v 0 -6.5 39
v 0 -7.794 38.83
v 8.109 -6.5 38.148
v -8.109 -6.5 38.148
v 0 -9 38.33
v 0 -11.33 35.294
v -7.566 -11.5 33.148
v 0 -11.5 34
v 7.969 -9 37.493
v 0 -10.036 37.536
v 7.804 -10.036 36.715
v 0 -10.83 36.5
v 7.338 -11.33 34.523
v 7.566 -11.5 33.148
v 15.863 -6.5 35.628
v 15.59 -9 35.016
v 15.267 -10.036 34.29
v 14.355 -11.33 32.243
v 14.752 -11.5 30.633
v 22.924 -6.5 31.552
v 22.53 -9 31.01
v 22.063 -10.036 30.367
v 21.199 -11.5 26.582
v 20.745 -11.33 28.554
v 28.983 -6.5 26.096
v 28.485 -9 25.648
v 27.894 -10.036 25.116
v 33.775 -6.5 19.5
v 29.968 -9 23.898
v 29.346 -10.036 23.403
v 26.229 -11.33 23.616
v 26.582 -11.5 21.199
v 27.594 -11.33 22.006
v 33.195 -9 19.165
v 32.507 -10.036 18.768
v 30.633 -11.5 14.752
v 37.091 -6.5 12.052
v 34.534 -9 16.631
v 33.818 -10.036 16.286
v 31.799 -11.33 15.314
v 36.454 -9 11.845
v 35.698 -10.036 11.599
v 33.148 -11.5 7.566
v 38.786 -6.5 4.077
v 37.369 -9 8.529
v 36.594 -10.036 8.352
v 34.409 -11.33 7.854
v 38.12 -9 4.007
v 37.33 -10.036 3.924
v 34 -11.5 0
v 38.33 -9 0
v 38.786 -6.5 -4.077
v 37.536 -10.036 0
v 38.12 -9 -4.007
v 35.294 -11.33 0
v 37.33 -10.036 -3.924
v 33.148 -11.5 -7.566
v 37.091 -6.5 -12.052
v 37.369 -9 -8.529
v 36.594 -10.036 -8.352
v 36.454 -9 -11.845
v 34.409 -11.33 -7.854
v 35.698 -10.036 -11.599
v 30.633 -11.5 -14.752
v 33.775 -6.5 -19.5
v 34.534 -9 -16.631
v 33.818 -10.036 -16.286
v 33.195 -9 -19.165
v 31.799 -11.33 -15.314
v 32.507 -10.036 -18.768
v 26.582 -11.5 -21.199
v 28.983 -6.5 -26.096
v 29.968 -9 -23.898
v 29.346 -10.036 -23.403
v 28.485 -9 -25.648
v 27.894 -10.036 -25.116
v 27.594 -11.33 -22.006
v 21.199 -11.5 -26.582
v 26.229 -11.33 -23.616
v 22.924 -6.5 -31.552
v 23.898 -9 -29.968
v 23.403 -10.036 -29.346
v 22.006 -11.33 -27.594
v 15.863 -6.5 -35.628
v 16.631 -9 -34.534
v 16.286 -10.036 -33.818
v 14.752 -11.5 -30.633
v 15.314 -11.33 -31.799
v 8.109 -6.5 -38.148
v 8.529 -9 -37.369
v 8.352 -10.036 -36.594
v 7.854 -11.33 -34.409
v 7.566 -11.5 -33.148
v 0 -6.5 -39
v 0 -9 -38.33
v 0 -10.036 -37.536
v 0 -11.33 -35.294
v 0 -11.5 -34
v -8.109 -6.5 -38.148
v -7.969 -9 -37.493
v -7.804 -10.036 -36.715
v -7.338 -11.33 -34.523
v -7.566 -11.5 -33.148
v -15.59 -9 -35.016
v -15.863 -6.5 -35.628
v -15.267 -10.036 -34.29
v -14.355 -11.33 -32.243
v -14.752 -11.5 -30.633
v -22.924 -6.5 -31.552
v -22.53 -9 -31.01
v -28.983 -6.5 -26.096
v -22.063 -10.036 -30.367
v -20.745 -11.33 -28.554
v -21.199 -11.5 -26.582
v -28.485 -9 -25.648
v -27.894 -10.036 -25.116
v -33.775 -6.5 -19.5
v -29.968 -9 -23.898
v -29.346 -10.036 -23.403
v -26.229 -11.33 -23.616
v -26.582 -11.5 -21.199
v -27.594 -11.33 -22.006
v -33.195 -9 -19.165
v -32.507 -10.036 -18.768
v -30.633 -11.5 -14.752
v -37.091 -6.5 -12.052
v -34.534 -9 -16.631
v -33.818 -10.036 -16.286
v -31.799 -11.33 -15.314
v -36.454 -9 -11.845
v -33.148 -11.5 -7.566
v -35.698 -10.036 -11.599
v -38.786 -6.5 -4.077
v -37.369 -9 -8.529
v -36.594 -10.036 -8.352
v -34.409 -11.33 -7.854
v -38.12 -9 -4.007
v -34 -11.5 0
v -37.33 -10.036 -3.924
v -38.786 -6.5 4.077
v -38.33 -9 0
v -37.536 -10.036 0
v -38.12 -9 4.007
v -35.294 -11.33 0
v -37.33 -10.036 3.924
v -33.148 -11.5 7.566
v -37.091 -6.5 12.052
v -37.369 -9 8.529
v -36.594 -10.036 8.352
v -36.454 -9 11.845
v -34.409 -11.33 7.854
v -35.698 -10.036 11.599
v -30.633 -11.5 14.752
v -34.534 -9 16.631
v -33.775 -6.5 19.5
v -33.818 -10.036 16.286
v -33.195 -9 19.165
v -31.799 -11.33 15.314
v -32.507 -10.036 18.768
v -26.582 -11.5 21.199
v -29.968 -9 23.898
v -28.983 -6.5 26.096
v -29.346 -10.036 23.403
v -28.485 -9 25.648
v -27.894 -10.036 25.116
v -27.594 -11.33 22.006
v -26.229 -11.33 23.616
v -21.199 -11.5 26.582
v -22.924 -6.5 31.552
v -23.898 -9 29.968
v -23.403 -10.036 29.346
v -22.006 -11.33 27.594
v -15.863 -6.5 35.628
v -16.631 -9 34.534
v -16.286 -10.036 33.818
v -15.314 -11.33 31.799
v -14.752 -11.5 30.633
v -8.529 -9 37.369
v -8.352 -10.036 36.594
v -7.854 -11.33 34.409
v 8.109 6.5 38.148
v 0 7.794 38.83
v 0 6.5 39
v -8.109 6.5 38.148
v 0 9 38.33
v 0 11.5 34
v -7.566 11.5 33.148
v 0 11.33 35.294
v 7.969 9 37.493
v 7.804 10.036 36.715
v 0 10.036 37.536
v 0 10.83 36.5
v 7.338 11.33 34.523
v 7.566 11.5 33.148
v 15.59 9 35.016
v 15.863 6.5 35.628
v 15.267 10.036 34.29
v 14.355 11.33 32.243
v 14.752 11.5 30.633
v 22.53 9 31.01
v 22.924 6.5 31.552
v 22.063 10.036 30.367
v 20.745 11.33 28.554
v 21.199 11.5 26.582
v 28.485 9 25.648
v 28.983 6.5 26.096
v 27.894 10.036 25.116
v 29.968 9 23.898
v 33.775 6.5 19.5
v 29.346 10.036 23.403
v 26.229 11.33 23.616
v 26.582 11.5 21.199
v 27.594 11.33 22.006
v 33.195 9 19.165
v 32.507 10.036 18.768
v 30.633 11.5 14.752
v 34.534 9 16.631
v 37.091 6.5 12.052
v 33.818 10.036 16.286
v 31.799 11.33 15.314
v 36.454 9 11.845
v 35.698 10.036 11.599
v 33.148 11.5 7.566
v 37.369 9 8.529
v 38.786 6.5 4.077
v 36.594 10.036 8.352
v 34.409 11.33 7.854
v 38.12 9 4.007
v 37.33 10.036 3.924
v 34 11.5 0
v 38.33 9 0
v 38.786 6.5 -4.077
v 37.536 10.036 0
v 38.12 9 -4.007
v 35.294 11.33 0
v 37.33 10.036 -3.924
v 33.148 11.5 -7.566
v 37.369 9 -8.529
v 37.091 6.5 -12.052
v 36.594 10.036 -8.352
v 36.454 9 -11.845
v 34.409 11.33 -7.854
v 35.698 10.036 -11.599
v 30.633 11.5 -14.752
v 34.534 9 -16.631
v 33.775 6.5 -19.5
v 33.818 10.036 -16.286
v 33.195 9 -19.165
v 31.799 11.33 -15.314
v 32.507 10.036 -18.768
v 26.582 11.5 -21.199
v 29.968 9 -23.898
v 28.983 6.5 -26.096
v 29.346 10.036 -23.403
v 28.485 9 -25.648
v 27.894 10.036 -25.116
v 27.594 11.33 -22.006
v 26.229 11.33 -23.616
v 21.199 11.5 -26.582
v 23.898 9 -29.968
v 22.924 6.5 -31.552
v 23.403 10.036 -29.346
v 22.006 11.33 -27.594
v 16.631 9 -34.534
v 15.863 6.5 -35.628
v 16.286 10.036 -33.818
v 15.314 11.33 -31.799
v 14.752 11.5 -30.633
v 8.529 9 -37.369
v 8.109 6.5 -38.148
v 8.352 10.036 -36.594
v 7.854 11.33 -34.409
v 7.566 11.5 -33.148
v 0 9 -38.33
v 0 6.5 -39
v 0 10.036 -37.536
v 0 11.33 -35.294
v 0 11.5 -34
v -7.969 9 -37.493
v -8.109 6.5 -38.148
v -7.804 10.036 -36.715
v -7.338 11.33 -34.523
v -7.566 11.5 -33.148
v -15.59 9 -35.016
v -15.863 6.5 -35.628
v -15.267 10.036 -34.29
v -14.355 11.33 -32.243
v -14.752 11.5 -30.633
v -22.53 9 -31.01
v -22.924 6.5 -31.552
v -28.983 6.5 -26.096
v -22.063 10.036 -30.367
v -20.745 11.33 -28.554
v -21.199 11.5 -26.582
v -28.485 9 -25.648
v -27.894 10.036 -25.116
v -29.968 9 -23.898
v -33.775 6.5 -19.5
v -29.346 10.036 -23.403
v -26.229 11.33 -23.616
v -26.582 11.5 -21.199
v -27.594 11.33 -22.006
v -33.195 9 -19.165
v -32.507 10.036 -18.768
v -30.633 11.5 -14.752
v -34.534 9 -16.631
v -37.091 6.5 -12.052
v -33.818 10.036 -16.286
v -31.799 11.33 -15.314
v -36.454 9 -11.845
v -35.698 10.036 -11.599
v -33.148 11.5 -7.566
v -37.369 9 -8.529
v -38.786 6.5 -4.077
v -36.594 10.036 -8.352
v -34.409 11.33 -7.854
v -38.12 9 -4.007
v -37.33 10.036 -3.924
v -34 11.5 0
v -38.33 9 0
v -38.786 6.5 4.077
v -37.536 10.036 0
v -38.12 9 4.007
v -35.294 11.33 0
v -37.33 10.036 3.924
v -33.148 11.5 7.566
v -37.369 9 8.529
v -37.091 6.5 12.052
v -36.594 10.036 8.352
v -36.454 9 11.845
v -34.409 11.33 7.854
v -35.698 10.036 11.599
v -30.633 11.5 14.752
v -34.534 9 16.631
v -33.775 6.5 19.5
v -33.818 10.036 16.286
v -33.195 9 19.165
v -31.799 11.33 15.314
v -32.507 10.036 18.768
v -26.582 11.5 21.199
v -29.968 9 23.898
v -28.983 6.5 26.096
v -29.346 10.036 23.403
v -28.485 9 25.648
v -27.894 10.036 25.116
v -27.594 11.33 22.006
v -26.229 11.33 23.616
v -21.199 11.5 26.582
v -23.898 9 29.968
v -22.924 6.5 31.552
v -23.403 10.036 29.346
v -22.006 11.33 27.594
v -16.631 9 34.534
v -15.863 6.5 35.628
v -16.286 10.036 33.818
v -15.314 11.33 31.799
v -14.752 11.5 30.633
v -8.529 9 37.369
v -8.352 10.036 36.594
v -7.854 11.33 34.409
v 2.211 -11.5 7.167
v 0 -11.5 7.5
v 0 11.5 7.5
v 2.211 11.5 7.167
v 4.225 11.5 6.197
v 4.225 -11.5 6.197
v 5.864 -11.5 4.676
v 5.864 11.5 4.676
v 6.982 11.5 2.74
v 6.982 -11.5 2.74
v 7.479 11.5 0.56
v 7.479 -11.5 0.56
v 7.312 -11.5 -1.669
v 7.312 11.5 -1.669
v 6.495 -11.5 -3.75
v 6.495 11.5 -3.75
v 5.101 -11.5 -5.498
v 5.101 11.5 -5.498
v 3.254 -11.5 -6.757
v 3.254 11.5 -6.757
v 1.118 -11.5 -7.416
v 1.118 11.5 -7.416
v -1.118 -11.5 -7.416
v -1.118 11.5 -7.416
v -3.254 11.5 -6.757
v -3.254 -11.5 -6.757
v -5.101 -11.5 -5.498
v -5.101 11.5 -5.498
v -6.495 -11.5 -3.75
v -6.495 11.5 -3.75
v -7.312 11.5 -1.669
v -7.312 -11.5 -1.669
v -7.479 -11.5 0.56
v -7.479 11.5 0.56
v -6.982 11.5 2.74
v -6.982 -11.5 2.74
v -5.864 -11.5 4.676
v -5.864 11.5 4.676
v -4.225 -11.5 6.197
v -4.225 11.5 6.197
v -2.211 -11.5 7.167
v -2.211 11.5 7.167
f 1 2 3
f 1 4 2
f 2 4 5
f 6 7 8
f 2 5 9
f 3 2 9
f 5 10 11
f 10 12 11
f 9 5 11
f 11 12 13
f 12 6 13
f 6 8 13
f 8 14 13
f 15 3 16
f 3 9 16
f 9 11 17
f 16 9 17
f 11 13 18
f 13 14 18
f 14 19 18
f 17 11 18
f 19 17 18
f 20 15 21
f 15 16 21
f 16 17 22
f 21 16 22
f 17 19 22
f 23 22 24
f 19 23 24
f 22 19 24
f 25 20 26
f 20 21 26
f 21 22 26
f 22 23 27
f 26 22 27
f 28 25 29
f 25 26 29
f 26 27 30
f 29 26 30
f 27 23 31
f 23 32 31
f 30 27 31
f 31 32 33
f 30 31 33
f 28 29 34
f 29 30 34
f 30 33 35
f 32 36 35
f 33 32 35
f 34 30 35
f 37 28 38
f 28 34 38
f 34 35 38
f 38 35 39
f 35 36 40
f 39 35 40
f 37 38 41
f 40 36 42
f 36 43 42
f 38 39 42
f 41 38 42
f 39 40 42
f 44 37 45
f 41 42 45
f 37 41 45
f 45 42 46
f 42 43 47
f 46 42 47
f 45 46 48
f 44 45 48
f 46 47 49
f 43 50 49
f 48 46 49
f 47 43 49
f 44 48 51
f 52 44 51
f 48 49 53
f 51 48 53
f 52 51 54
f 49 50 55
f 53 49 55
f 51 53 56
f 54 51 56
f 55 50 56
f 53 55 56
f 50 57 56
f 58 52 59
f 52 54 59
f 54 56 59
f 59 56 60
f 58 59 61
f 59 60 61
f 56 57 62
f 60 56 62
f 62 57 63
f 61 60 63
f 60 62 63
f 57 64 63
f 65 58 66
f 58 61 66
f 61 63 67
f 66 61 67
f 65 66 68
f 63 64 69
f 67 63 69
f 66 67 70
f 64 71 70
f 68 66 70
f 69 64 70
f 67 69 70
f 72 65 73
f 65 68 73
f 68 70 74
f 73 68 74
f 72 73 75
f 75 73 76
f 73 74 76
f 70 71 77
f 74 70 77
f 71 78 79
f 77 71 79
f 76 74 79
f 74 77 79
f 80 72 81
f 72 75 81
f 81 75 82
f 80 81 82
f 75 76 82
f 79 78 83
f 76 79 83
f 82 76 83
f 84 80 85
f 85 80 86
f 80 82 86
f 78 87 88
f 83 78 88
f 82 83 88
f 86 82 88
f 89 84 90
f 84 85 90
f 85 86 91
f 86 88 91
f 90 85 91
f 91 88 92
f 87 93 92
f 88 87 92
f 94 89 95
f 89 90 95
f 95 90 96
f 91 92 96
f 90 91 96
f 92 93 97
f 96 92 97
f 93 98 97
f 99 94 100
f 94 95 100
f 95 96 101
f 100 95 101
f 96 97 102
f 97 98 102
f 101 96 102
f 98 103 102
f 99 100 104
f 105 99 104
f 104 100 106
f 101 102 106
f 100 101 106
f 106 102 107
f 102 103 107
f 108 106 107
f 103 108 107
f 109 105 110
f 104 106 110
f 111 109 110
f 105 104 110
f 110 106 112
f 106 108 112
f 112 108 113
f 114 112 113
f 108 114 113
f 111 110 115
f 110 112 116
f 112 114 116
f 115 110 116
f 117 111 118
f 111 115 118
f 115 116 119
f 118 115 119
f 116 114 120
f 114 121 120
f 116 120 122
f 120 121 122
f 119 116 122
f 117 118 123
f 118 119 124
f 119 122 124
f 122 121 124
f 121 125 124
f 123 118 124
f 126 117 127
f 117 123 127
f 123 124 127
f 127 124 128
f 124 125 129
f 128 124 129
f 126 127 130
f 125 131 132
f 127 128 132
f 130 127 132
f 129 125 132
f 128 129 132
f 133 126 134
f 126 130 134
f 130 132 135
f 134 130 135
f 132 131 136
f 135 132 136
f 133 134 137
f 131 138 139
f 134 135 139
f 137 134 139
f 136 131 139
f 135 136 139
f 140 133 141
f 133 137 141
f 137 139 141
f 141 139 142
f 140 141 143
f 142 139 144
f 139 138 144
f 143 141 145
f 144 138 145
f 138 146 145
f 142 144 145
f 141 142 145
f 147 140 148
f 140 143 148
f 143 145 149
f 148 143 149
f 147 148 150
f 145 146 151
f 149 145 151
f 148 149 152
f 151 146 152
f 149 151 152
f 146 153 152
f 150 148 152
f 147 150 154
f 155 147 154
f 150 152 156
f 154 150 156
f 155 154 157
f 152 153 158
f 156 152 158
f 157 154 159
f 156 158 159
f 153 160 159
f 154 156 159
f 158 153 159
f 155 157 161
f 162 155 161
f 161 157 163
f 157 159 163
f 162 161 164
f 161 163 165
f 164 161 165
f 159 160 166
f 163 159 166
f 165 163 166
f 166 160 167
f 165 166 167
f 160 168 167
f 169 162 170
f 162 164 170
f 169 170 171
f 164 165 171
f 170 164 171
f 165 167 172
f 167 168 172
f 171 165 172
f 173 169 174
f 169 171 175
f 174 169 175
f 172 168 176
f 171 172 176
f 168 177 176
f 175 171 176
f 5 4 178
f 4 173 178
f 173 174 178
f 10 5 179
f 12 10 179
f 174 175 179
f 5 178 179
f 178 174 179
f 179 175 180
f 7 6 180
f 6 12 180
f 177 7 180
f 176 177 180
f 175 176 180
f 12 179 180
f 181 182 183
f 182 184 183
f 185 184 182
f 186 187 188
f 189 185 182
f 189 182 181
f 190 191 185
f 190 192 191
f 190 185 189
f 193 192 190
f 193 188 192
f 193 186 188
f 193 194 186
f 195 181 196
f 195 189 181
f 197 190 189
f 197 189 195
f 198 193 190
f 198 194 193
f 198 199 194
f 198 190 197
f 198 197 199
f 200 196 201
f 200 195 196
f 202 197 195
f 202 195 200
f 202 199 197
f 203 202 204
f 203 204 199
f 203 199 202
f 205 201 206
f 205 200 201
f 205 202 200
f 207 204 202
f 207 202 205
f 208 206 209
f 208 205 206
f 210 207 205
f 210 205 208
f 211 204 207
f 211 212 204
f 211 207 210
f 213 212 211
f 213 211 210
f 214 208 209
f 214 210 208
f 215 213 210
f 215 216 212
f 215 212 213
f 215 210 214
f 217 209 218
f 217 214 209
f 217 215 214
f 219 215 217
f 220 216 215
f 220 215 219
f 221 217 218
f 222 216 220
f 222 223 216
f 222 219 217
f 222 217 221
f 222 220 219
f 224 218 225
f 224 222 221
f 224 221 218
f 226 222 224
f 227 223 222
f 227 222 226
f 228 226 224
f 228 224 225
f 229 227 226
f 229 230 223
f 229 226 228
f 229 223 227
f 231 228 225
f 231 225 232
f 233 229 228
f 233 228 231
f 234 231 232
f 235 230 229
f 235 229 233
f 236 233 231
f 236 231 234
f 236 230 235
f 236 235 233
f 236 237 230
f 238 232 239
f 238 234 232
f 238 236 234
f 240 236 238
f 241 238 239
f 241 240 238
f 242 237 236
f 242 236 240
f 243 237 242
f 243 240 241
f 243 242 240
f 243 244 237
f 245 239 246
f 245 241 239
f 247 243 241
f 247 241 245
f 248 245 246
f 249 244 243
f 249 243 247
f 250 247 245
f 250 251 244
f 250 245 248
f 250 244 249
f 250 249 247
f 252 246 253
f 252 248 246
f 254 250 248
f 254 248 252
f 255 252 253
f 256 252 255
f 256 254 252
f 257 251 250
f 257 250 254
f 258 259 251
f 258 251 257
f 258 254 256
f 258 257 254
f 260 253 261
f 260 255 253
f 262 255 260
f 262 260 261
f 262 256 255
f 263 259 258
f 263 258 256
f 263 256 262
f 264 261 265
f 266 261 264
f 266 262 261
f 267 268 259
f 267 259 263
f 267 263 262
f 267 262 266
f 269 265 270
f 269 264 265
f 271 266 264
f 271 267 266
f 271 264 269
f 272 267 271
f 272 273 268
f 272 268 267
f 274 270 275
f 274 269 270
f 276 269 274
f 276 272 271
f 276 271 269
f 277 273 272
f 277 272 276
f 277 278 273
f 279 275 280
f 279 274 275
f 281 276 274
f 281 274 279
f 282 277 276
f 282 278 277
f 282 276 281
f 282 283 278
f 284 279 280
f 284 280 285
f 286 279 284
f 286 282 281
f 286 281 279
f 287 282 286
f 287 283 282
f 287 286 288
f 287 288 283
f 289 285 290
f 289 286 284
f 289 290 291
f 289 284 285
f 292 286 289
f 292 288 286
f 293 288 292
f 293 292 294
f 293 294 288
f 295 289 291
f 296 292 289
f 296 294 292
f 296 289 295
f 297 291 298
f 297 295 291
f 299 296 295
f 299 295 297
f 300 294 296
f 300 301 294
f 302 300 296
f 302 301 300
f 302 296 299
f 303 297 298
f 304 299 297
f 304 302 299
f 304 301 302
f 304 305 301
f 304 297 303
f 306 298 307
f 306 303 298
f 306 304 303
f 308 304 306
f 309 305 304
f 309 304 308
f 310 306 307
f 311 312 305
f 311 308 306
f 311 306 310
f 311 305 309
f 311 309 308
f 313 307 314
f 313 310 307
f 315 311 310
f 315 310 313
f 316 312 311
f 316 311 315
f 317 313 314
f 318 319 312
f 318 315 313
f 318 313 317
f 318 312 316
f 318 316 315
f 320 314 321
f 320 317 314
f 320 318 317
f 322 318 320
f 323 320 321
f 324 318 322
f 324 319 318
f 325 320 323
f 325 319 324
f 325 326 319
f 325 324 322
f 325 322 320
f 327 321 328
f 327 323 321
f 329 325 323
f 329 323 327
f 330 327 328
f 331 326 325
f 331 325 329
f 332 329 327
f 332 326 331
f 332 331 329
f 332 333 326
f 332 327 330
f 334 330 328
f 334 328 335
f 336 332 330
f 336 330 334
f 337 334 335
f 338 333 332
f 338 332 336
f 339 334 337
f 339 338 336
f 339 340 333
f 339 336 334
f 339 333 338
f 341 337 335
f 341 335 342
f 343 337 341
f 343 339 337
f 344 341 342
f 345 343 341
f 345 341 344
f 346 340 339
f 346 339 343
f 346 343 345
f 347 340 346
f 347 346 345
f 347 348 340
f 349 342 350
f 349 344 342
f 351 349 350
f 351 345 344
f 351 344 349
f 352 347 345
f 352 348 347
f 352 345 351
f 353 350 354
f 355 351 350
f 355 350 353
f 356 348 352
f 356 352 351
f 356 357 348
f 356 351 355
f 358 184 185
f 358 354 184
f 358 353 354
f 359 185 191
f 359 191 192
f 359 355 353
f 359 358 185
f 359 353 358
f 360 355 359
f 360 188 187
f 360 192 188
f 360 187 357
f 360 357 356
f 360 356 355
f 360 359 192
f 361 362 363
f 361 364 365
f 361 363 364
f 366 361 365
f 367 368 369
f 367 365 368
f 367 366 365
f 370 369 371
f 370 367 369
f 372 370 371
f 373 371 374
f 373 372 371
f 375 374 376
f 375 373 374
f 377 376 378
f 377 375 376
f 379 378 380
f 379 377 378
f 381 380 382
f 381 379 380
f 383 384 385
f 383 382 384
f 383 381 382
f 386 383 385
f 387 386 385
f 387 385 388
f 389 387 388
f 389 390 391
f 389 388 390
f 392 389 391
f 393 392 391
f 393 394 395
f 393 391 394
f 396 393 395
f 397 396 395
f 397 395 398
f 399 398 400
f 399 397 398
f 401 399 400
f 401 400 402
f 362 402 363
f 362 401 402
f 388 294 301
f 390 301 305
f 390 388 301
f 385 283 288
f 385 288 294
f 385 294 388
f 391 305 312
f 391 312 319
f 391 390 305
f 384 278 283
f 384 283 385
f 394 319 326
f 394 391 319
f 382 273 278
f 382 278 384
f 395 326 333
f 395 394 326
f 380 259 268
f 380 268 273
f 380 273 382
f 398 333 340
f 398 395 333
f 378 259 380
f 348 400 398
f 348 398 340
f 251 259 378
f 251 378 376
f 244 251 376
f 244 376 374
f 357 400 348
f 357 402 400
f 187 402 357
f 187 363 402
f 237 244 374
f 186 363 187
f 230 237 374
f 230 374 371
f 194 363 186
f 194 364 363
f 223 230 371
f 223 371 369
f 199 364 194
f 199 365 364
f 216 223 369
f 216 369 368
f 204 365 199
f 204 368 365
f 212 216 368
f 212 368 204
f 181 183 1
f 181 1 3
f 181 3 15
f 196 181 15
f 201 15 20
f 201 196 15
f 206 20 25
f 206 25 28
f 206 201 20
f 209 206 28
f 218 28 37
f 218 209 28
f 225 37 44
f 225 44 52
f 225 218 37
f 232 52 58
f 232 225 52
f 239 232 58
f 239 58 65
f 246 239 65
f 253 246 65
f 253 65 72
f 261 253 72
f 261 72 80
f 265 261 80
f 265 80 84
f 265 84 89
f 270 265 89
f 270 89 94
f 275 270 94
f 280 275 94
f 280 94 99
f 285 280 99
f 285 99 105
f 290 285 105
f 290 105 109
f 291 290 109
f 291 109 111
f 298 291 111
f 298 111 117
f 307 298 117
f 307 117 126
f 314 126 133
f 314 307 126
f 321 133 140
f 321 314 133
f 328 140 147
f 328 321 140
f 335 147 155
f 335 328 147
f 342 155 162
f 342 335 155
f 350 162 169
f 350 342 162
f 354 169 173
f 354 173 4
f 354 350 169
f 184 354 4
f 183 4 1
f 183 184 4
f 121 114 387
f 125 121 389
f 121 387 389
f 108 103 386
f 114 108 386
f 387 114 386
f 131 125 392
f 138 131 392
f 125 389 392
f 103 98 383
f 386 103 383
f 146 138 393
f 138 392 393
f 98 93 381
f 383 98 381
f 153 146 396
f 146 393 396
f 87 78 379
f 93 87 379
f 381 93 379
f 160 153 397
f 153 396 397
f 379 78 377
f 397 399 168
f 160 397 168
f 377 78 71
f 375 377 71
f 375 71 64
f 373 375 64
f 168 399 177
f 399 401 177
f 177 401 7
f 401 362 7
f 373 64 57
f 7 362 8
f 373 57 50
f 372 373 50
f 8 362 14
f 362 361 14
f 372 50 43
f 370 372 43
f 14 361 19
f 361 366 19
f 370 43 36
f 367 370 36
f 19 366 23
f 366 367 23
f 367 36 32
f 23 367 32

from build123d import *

# Parameters (mm, degrees)
SKETCH1_R               = 39
BOSS_EXTRUDE1_DEPTH     = 11.5
FILLET1_R               = 5
CUT_EXTRUDE1_DEPTH      = 60.757844673
CUT_EXTRUDE1_DEPTH_BACK = 60.757844673
SKETCH2_R               = 7.5


with BuildPart() as part:
    # Sketch1 → Boss-Extrude1 (new, symmetric)
    with BuildSketch(Plane(origin=(0, 0, 0), x_dir=(1, 0, 0), z_dir=(0, 1, 0))):
        with Locations(Location((0, 0, 0), (0, 0, 270))):
            Circle(SKETCH1_R)
    extrude(amount=BOSS_EXTRUDE1_DEPTH, both=True)

    # Fillet1
    fillet1_edges = [part.edges().sort_by_distance(p)[0] for p in [
        (0, -11.5, -39),
        (0, 11.5, -39),
    ]]
    fillet(fillet1_edges, radius=FILLET1_R)

    # Sketch2 → Cut-Extrude1 (cut, two sides: drawn at the far end of the back side and taken through both)
    with BuildSketch(Plane(origin=(0, 11.5, 0), x_dir=(1, 0, 0), z_dir=(0, 1, 0)).offset(-CUT_EXTRUDE1_DEPTH_BACK)):
        with Locations(Location((0, 0, 0), (0, 0, 270))):
            Circle(SKETCH2_R)
    extrude(amount=CUT_EXTRUDE1_DEPTH + CUT_EXTRUDE1_DEPTH_BACK, mode=Mode.SUBTRACT)


solid = part.part
